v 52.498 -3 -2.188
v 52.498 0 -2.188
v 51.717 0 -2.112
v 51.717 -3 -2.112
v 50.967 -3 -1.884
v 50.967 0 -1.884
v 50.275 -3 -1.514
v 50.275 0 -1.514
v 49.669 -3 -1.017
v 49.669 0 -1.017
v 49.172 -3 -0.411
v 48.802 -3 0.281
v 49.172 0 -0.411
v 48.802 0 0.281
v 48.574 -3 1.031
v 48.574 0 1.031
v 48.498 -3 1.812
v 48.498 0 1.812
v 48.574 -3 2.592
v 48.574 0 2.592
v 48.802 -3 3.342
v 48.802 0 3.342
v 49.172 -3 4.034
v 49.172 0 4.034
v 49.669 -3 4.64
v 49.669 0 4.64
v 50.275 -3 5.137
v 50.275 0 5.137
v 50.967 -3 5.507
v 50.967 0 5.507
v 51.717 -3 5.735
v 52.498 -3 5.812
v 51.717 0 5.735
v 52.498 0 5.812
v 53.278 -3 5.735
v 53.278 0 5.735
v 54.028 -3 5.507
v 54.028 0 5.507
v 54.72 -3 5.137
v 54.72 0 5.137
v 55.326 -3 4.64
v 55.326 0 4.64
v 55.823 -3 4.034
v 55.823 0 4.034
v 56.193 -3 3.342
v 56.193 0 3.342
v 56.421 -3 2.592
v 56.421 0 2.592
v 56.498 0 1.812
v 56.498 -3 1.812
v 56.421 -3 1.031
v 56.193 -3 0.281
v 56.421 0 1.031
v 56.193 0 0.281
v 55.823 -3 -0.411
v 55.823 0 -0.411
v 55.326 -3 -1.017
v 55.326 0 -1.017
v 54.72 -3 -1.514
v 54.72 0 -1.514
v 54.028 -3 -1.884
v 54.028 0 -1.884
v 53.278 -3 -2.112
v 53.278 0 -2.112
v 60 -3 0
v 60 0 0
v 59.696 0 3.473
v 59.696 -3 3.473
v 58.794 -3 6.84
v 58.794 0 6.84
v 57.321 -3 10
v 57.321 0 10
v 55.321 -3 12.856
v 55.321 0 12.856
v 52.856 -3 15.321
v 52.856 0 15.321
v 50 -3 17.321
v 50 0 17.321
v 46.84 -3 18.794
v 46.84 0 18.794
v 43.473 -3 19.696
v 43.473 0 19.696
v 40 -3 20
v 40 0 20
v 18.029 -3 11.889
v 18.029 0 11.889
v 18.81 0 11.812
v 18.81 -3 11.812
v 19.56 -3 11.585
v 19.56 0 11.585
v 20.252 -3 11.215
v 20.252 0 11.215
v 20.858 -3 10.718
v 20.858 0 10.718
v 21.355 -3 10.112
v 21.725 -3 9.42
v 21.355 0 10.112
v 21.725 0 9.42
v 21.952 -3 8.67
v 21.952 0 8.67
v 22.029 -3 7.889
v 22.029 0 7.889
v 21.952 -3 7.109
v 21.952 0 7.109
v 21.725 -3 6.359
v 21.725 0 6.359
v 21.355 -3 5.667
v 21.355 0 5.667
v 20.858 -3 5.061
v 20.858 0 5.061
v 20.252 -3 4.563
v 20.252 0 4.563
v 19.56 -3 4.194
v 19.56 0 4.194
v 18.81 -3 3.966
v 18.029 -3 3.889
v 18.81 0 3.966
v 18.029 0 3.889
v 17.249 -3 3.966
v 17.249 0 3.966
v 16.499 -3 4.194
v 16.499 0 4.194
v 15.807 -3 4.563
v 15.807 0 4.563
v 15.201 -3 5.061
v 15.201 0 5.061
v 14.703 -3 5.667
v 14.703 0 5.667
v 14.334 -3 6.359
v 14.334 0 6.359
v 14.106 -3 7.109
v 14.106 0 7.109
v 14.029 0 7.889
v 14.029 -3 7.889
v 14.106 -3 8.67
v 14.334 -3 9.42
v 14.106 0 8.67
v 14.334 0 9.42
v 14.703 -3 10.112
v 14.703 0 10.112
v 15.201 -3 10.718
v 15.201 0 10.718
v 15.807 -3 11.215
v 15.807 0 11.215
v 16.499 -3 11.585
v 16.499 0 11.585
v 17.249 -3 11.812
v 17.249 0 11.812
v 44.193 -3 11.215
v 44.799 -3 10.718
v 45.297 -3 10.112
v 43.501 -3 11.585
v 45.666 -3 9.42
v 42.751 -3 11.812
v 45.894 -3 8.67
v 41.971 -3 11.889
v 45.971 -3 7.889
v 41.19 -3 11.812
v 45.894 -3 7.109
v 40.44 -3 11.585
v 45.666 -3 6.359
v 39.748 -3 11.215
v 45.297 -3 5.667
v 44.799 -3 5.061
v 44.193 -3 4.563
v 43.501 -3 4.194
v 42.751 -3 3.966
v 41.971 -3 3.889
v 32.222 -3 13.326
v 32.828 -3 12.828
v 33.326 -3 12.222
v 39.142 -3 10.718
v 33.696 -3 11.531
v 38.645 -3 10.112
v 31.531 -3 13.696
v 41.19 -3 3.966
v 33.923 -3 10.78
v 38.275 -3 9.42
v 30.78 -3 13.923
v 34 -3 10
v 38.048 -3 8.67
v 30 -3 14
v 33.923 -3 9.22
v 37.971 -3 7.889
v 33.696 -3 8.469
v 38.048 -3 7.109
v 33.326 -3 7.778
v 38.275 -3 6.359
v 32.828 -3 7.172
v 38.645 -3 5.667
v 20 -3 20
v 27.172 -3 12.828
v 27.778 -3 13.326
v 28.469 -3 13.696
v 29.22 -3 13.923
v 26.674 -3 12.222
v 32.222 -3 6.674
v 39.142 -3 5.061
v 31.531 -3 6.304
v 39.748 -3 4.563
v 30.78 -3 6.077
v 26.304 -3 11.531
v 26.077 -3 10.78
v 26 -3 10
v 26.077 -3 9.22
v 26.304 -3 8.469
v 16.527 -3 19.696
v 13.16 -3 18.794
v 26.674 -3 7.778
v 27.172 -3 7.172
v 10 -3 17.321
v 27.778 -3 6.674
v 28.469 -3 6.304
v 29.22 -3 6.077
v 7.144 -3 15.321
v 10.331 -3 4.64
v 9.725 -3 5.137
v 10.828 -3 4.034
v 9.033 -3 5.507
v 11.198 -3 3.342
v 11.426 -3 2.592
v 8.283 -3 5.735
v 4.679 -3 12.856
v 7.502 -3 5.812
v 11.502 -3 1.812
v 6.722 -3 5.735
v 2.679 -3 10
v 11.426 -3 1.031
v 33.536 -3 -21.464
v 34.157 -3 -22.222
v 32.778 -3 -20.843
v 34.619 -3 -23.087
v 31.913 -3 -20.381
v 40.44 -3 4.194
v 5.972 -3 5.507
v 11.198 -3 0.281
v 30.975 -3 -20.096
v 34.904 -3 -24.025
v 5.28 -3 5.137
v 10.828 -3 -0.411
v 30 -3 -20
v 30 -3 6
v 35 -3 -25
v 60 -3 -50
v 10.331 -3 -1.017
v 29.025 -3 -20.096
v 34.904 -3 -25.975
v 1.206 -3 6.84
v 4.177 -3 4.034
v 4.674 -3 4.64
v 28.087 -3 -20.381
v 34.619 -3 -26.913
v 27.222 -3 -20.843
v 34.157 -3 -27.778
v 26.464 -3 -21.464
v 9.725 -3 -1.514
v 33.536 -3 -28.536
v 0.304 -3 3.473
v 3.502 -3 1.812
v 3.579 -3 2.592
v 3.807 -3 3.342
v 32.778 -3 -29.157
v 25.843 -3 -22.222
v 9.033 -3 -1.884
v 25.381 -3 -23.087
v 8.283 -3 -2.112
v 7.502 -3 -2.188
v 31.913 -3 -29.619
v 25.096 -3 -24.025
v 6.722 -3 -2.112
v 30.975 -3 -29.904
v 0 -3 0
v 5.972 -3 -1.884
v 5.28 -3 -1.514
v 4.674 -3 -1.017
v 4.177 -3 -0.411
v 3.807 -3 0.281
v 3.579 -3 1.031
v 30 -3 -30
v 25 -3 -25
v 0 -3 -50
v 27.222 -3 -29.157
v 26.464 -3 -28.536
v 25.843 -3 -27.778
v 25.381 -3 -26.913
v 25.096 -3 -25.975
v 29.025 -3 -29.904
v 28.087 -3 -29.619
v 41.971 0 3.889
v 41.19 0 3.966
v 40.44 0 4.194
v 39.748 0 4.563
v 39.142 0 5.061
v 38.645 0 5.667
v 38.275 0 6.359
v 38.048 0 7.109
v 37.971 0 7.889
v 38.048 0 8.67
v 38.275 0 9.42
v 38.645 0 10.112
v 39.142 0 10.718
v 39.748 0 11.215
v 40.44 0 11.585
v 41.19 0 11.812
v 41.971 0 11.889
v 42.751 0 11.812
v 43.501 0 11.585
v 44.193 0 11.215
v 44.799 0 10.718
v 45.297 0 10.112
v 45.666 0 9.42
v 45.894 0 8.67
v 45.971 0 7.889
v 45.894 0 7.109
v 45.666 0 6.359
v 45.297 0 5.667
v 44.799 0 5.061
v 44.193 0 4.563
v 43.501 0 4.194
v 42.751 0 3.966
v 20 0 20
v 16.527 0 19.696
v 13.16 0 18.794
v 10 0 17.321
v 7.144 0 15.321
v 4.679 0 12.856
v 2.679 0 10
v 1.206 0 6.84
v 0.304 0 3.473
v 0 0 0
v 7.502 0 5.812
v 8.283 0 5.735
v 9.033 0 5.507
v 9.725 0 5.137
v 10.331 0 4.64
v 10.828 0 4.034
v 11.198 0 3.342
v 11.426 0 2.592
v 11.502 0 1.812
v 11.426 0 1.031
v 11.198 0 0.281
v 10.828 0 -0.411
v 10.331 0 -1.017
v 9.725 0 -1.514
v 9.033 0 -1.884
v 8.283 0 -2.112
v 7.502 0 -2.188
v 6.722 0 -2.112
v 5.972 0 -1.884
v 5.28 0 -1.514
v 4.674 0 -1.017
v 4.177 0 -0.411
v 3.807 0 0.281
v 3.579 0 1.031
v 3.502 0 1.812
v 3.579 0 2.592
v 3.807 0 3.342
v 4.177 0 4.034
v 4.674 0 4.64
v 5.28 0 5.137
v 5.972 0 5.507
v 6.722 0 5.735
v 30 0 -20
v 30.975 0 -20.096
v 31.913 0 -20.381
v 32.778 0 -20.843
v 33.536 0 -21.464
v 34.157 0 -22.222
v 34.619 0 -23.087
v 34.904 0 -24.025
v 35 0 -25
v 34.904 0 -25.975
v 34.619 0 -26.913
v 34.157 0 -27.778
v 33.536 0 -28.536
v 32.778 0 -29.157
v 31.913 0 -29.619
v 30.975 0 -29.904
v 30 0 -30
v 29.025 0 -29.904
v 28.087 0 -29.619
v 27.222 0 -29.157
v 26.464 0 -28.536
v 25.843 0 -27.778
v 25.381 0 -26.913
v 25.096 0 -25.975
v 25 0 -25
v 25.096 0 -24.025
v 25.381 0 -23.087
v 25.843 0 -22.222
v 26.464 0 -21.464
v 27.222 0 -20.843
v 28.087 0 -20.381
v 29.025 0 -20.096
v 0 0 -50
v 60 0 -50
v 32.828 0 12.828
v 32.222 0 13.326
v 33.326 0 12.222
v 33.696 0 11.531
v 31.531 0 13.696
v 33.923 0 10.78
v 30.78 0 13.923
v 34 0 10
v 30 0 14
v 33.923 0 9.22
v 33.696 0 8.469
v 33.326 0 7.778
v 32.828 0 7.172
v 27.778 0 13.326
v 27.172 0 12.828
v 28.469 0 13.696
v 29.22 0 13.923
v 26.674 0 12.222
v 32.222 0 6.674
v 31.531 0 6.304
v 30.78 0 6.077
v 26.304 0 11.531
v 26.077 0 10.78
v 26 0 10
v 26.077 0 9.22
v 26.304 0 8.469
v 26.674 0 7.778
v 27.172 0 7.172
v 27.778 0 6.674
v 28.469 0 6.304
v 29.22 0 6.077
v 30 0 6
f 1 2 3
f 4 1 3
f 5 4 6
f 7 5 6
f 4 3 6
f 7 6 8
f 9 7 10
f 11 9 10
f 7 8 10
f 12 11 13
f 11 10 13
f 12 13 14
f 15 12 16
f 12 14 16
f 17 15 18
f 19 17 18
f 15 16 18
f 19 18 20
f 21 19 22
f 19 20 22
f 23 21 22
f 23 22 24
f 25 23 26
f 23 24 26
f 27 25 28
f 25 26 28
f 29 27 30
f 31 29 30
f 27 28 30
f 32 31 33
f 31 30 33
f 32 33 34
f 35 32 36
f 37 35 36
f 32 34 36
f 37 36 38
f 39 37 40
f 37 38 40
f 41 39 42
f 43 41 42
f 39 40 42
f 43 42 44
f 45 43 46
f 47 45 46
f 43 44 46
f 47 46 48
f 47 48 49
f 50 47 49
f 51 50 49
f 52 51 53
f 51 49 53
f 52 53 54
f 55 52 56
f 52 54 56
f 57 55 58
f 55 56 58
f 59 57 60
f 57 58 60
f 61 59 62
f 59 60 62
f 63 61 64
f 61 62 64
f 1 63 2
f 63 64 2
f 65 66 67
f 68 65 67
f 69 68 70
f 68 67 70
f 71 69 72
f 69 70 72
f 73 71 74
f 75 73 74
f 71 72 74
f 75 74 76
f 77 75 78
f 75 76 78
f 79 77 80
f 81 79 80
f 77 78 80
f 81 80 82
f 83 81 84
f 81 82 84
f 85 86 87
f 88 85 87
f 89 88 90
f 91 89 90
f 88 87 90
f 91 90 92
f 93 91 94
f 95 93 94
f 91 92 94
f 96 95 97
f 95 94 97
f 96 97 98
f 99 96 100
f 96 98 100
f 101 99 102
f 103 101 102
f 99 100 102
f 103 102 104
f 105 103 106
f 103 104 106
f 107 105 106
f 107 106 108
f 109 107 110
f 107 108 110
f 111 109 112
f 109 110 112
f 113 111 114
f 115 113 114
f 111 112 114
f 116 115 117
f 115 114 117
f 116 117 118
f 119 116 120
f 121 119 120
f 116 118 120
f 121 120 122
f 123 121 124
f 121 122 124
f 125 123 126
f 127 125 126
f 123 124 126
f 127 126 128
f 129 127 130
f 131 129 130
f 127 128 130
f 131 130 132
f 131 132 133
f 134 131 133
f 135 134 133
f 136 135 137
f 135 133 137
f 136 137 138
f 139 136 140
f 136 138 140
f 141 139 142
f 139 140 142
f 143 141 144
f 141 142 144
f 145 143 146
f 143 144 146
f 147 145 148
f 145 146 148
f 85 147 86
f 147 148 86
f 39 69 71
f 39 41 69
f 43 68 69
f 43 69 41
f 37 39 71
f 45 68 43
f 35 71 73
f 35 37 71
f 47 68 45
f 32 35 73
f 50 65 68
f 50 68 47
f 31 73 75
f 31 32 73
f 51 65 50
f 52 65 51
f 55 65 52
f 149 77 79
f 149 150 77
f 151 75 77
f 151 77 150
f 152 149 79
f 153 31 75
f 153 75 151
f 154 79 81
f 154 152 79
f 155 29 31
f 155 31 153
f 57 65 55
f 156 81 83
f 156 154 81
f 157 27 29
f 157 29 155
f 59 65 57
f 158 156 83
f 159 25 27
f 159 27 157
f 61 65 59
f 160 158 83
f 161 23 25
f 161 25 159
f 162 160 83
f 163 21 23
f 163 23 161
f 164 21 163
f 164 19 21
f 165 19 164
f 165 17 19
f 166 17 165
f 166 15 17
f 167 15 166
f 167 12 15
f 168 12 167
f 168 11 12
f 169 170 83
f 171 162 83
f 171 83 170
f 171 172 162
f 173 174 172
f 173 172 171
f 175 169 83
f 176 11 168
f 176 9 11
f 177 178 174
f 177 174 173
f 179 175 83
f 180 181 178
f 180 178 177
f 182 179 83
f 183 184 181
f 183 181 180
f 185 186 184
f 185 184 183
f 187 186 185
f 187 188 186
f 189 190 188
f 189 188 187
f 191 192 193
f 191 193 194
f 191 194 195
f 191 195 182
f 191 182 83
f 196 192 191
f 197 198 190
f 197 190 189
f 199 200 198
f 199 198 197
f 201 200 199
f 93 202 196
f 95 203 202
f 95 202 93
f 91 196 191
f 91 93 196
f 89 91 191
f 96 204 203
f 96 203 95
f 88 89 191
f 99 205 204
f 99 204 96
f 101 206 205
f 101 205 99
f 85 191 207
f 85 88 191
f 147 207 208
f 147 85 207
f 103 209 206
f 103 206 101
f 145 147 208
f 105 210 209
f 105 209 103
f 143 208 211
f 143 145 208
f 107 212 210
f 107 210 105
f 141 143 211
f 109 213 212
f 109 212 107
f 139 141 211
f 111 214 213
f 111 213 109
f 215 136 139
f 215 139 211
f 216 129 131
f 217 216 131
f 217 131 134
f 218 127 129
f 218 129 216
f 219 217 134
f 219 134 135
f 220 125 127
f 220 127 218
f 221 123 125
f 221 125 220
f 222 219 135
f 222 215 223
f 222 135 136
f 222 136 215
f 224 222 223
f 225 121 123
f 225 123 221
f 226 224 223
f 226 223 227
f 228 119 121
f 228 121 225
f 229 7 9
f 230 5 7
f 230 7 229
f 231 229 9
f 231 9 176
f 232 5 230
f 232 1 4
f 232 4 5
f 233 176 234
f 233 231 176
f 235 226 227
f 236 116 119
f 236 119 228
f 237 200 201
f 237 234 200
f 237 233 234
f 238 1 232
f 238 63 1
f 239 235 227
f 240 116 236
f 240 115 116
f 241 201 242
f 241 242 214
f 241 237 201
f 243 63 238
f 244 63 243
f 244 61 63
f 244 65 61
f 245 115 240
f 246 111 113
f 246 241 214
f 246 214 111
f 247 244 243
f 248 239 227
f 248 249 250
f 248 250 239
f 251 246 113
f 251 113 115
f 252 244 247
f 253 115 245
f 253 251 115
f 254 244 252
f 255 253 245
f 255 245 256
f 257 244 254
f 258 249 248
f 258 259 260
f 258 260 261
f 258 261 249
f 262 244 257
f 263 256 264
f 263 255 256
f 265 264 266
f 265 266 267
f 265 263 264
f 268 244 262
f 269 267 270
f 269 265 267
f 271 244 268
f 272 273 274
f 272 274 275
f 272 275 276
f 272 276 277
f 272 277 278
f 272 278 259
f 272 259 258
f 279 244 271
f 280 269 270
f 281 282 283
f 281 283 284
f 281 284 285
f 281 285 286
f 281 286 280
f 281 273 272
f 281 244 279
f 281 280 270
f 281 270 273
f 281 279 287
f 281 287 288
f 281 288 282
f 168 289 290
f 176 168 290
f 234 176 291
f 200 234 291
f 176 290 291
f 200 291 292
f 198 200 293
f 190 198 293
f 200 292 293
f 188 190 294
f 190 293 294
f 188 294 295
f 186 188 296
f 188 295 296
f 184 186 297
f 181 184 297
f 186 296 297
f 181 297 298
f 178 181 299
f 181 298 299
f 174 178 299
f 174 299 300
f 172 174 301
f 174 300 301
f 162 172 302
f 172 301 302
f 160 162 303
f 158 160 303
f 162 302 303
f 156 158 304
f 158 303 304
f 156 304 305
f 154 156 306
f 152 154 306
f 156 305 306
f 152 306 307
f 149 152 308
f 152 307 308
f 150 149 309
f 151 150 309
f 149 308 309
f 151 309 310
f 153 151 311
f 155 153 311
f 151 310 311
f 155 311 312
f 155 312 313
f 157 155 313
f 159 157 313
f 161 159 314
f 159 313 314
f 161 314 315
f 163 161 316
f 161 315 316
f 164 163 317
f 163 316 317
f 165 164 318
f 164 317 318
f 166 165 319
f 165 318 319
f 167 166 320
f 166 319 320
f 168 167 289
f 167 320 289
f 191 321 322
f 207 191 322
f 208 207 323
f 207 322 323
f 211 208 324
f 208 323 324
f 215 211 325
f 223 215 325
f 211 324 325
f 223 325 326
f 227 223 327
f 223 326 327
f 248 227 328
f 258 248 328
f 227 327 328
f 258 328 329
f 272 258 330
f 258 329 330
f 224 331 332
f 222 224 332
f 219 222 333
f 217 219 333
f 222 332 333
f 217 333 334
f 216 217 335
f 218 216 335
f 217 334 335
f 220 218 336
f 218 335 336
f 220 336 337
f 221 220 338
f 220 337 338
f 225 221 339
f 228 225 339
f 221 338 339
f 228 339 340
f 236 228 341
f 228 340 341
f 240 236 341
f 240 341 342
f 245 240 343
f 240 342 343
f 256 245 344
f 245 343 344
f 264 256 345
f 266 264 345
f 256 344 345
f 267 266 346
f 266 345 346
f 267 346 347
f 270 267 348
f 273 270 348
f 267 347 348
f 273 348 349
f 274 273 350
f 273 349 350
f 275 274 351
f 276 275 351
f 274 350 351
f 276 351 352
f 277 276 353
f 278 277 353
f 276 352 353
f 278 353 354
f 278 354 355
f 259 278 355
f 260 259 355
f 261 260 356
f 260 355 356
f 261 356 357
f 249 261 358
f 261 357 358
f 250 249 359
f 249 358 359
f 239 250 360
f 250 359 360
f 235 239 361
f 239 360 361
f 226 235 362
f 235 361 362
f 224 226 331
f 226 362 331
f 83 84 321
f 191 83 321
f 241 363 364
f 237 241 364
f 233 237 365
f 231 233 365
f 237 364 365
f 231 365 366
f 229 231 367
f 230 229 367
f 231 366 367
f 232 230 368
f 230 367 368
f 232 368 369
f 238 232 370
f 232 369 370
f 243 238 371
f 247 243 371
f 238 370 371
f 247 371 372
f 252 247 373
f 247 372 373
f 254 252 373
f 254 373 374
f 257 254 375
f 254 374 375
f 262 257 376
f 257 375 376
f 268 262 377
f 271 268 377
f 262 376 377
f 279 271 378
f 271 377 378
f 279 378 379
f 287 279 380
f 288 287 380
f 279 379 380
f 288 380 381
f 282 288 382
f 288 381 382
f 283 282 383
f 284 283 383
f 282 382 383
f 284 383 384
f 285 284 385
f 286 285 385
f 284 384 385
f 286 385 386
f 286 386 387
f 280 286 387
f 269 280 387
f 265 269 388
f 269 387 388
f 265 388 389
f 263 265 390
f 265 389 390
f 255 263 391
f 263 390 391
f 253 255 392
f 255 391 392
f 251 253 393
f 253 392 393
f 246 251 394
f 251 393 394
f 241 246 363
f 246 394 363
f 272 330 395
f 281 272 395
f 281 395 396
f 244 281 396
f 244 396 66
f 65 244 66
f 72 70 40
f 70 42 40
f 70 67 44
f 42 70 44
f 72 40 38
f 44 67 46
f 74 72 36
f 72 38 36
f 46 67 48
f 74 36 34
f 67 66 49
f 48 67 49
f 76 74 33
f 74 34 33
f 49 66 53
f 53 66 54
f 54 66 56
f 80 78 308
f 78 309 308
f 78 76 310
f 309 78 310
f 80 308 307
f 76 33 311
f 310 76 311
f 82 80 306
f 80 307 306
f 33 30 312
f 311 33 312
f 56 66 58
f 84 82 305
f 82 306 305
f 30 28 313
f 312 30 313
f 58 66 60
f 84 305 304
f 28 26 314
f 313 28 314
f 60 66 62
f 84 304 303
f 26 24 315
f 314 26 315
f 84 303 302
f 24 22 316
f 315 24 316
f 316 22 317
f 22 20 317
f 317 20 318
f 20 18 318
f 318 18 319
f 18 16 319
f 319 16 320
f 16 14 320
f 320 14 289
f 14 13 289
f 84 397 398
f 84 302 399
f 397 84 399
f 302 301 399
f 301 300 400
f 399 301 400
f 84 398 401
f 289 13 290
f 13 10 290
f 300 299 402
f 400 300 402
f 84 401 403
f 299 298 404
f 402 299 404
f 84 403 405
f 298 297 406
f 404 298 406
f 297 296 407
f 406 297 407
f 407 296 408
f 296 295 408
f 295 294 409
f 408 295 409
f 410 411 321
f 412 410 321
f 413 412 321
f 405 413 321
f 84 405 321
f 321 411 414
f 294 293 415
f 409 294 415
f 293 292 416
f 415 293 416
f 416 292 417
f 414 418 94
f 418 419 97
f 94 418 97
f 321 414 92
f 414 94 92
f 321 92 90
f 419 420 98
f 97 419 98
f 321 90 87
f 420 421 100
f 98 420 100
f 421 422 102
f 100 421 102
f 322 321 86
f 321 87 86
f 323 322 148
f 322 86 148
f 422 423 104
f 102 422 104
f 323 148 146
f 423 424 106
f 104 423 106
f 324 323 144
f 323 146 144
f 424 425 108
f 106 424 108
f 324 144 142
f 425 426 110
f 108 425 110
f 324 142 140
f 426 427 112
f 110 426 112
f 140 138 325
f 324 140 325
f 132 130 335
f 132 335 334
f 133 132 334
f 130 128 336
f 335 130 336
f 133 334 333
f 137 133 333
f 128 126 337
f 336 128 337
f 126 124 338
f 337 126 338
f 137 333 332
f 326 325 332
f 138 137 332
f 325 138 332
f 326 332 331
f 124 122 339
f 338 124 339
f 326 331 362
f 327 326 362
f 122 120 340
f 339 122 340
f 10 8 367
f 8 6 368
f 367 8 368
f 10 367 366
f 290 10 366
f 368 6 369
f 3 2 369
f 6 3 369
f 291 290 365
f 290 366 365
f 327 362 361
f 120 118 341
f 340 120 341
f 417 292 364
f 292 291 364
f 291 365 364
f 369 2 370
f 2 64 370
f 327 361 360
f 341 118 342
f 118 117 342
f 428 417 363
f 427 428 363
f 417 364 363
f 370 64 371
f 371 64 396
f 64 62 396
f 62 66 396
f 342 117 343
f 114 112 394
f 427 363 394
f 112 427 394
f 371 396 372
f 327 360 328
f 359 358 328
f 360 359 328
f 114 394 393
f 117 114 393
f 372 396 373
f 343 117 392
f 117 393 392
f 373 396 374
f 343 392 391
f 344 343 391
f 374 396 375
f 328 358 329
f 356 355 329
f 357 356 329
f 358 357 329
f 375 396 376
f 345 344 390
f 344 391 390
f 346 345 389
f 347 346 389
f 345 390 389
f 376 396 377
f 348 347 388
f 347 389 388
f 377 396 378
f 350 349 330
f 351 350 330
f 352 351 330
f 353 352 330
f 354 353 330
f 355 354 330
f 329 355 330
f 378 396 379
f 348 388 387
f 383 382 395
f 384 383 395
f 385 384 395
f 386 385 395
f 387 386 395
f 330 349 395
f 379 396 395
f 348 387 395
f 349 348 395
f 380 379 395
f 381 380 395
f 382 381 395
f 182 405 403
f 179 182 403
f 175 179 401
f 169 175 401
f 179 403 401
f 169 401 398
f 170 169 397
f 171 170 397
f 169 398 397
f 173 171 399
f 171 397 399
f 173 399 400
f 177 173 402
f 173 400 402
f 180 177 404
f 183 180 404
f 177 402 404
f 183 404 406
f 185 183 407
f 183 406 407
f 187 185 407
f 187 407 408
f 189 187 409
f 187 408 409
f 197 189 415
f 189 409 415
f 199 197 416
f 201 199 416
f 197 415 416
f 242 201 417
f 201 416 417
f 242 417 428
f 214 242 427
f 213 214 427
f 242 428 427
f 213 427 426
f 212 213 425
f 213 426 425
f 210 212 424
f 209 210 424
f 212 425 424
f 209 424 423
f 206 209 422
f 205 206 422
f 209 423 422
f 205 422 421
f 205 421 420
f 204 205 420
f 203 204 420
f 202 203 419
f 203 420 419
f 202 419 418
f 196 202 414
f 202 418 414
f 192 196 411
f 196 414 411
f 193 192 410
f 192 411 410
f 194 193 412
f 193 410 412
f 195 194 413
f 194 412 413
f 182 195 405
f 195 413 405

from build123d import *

# Parameters (mm, degrees)
ESBO_O1_R          = 4
ESBO_O1_R_2        = 5
FLANGE_BASE1_DEPTH = 3


# Sheet-metal steps are written as plain solids
with BuildPart() as part:
    # Esboço1 → Flange-base1 (new body)
    with BuildSketch(Plane(origin=(0, 0, 0), x_dir=(1, 0, 0), z_dir=(0, 1, 0))):
        with BuildLine():
            Line((0, 0), (0, 50))
            Line((0, 50), (60, 50))
            Line((60, 50), (60, 0))
            ThreePointArc((60, 0), (54.142135624, -14.142135624), (40, -20))
            Line((40, -20), (20, -20))
            ThreePointArc((20, -20), (5.857864376, -14.142135624), (0, 0))
        make_face()
        with Locations(Location((30, -10, 0), (0, 0, 270))):
            Circle(ESBO_O1_R, mode=Mode.SUBTRACT)
        with Locations(Location((18.029294984, -7.889241728, 0), (0, 0, 270))):
            Circle(ESBO_O1_R, mode=Mode.SUBTRACT)
        with Locations(Location((7.502433661, -1.811555509, 0), (0, 0, 270))):
            Circle(ESBO_O1_R, mode=Mode.SUBTRACT)
        with Locations(Location((52.497566339, -1.811555509, 0), (0, 0, 90))):
            Circle(ESBO_O1_R, mode=Mode.SUBTRACT)
        with Locations(Location((41.970705016, -7.889241728, 0), (0, 0, 90))):
            Circle(ESBO_O1_R, mode=Mode.SUBTRACT)
        with Locations(Location((30, 25, 0), (0, 0, 270))):
            Circle(ESBO_O1_R_2, mode=Mode.SUBTRACT)
    extrude(amount=-FLANGE_BASE1_DEPTH)


solid = part.part
